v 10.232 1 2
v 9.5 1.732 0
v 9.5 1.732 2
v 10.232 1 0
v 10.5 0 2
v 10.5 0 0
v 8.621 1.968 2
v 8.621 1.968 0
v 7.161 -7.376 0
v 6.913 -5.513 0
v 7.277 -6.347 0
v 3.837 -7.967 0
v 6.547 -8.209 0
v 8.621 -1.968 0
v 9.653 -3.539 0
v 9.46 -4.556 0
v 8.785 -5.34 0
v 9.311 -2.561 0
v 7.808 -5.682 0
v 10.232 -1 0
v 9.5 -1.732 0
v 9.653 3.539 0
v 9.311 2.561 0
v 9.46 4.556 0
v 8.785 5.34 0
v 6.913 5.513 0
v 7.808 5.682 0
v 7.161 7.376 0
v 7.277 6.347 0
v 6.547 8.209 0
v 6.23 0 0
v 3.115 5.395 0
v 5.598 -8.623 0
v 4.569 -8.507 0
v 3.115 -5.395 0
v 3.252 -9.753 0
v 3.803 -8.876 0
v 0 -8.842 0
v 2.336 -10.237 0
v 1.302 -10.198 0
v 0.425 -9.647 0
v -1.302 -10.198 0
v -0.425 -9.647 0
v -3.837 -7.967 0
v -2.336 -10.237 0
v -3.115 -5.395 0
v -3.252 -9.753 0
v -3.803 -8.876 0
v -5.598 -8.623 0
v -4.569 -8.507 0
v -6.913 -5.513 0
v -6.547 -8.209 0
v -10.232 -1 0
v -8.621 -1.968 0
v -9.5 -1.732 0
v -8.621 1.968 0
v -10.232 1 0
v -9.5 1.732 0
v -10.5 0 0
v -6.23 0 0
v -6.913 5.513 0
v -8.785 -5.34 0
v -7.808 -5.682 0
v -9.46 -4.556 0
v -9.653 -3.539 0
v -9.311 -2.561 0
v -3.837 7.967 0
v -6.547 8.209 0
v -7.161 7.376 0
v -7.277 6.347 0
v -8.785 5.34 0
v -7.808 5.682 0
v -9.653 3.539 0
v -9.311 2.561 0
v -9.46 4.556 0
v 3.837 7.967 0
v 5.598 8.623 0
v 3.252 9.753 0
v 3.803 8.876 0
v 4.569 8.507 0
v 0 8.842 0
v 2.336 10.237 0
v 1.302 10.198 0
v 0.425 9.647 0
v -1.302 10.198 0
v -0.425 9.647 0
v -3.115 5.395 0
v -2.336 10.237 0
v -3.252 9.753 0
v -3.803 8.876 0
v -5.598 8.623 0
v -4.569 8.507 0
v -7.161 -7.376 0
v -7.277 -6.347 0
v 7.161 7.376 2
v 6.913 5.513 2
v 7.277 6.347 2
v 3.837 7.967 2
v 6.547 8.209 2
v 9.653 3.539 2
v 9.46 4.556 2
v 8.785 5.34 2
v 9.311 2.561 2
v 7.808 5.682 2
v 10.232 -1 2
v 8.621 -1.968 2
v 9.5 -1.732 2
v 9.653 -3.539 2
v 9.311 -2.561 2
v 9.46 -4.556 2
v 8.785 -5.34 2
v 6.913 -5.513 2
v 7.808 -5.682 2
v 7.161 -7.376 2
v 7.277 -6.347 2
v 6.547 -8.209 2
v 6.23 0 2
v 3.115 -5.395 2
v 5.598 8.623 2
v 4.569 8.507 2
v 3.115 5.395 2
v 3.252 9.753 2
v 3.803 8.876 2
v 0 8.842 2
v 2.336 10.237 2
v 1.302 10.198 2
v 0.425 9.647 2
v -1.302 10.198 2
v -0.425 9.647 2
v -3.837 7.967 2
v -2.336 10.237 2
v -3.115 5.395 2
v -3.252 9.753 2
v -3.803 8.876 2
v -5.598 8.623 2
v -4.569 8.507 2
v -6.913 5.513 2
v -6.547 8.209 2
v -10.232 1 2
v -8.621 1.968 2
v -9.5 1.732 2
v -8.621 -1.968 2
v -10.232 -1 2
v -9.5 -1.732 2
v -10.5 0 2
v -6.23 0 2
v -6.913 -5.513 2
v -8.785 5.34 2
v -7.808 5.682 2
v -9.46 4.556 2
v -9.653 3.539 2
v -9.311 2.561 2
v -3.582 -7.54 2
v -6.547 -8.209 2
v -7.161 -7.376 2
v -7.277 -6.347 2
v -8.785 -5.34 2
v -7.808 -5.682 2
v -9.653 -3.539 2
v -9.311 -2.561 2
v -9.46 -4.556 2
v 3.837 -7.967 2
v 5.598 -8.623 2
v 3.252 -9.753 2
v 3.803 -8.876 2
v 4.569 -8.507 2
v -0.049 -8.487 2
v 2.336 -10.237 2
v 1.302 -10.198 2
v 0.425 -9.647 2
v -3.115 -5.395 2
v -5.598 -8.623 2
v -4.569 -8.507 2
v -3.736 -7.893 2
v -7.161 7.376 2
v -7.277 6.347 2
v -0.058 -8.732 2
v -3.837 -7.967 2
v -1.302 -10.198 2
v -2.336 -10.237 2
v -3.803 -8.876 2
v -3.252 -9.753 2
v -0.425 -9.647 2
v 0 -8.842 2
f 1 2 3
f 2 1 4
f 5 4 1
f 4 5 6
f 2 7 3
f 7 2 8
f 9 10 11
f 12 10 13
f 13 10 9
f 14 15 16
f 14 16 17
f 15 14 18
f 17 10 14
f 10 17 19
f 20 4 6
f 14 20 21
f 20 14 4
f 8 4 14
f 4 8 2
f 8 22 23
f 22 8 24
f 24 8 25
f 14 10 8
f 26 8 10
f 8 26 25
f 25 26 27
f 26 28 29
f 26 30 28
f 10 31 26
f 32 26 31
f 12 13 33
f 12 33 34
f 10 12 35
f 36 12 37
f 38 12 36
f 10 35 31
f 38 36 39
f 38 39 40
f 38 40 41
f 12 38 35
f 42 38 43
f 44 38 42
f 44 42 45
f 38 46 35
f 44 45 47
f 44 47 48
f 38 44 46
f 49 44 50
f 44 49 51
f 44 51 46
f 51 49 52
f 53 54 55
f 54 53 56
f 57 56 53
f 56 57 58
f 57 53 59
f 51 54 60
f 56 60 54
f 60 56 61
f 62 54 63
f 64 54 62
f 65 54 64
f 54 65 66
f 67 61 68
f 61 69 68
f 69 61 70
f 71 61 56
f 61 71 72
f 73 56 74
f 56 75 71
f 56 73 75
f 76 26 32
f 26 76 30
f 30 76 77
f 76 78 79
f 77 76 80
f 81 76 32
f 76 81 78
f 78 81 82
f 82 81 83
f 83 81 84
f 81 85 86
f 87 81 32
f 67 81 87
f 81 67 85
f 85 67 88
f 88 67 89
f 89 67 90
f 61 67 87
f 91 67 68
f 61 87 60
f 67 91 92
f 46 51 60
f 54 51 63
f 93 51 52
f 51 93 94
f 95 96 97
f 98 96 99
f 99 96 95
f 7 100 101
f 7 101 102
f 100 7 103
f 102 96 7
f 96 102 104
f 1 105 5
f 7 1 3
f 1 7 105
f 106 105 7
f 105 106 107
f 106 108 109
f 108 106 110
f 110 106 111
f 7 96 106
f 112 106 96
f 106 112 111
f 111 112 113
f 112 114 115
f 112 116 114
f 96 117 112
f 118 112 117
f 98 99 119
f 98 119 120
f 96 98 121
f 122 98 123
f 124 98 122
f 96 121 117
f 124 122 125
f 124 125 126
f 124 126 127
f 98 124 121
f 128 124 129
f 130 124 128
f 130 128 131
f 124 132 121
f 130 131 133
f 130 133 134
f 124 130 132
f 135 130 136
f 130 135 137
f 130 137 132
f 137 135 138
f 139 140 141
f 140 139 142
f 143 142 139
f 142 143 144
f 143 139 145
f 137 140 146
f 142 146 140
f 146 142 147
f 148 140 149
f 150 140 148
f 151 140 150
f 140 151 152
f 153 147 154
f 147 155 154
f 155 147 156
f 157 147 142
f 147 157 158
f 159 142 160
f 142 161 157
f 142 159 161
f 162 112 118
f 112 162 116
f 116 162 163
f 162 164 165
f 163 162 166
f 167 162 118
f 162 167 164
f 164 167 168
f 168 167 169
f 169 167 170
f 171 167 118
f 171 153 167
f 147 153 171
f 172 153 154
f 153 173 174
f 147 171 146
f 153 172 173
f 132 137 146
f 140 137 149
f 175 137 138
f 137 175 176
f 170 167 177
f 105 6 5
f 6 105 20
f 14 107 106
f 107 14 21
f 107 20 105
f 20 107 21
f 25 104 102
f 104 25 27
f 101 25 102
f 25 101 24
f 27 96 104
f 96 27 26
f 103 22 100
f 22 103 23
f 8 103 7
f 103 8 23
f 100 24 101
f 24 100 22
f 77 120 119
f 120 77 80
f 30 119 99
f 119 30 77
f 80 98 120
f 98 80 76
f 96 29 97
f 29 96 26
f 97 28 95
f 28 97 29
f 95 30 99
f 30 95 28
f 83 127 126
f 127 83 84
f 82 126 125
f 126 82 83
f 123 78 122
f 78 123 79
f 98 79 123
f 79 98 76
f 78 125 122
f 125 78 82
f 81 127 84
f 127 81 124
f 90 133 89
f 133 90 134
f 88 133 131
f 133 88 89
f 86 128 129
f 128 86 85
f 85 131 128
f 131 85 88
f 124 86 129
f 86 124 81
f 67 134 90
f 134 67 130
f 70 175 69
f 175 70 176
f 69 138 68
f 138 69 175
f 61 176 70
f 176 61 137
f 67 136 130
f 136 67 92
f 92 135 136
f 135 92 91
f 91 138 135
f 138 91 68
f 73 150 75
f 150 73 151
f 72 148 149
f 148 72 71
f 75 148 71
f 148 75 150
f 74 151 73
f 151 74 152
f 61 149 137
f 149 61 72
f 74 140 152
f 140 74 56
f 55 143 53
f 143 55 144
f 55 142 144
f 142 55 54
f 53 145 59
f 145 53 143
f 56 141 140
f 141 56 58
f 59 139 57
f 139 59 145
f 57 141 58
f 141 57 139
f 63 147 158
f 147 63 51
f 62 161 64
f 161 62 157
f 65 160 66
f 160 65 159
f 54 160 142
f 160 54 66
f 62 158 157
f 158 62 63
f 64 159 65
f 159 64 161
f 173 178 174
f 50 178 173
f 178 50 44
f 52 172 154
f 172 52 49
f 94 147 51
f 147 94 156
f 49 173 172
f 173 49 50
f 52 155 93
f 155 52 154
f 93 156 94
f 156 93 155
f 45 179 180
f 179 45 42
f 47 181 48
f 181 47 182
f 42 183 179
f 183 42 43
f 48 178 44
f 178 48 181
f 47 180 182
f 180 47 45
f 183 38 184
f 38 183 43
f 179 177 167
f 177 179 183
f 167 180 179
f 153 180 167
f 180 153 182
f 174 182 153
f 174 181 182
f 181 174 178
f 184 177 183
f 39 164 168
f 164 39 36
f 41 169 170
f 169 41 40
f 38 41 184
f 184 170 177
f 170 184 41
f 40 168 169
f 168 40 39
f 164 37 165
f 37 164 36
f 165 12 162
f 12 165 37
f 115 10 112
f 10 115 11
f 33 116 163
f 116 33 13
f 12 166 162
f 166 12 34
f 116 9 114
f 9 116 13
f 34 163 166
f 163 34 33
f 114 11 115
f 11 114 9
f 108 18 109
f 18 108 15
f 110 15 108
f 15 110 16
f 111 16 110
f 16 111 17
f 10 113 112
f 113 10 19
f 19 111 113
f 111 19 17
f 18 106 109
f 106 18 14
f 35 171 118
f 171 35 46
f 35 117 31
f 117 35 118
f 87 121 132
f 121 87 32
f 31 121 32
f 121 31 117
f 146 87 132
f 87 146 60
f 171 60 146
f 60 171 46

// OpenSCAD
// Knob for nut
// Hari Wiguna, 2014

nutHeight = 5.54;
nutWidestDiameter = 12.46;
knobHeight = 2.0;
knobDiameter = 17.0;
ridgeHeight = knobHeight;
ridgeRadius = 2;

// Computed
nutRadius = nutWidestDiameter / 2.0;
knobRadius = knobDiameter / 2.0;

difference()
{
	union()
	{
		// Knob
		cylinder( knobHeight, knobRadius, knobRadius, $fn=12 );
	
		// Knob ridges
		for (n=[0:1:13])
		{
			rotate(n*360/14,[0,0,1])
				translate([knobRadius,0,0]) 
					cylinder( ridgeHeight, ridgeRadius, ridgeRadius, $fn=12 );
		}
	}

	// Hexagon nut
	translate([0,0,-(nutHeight-knobHeight)/2]) 
		cylinder( nutHeight, nutRadius, nutRadius, $fn=6 );
}
